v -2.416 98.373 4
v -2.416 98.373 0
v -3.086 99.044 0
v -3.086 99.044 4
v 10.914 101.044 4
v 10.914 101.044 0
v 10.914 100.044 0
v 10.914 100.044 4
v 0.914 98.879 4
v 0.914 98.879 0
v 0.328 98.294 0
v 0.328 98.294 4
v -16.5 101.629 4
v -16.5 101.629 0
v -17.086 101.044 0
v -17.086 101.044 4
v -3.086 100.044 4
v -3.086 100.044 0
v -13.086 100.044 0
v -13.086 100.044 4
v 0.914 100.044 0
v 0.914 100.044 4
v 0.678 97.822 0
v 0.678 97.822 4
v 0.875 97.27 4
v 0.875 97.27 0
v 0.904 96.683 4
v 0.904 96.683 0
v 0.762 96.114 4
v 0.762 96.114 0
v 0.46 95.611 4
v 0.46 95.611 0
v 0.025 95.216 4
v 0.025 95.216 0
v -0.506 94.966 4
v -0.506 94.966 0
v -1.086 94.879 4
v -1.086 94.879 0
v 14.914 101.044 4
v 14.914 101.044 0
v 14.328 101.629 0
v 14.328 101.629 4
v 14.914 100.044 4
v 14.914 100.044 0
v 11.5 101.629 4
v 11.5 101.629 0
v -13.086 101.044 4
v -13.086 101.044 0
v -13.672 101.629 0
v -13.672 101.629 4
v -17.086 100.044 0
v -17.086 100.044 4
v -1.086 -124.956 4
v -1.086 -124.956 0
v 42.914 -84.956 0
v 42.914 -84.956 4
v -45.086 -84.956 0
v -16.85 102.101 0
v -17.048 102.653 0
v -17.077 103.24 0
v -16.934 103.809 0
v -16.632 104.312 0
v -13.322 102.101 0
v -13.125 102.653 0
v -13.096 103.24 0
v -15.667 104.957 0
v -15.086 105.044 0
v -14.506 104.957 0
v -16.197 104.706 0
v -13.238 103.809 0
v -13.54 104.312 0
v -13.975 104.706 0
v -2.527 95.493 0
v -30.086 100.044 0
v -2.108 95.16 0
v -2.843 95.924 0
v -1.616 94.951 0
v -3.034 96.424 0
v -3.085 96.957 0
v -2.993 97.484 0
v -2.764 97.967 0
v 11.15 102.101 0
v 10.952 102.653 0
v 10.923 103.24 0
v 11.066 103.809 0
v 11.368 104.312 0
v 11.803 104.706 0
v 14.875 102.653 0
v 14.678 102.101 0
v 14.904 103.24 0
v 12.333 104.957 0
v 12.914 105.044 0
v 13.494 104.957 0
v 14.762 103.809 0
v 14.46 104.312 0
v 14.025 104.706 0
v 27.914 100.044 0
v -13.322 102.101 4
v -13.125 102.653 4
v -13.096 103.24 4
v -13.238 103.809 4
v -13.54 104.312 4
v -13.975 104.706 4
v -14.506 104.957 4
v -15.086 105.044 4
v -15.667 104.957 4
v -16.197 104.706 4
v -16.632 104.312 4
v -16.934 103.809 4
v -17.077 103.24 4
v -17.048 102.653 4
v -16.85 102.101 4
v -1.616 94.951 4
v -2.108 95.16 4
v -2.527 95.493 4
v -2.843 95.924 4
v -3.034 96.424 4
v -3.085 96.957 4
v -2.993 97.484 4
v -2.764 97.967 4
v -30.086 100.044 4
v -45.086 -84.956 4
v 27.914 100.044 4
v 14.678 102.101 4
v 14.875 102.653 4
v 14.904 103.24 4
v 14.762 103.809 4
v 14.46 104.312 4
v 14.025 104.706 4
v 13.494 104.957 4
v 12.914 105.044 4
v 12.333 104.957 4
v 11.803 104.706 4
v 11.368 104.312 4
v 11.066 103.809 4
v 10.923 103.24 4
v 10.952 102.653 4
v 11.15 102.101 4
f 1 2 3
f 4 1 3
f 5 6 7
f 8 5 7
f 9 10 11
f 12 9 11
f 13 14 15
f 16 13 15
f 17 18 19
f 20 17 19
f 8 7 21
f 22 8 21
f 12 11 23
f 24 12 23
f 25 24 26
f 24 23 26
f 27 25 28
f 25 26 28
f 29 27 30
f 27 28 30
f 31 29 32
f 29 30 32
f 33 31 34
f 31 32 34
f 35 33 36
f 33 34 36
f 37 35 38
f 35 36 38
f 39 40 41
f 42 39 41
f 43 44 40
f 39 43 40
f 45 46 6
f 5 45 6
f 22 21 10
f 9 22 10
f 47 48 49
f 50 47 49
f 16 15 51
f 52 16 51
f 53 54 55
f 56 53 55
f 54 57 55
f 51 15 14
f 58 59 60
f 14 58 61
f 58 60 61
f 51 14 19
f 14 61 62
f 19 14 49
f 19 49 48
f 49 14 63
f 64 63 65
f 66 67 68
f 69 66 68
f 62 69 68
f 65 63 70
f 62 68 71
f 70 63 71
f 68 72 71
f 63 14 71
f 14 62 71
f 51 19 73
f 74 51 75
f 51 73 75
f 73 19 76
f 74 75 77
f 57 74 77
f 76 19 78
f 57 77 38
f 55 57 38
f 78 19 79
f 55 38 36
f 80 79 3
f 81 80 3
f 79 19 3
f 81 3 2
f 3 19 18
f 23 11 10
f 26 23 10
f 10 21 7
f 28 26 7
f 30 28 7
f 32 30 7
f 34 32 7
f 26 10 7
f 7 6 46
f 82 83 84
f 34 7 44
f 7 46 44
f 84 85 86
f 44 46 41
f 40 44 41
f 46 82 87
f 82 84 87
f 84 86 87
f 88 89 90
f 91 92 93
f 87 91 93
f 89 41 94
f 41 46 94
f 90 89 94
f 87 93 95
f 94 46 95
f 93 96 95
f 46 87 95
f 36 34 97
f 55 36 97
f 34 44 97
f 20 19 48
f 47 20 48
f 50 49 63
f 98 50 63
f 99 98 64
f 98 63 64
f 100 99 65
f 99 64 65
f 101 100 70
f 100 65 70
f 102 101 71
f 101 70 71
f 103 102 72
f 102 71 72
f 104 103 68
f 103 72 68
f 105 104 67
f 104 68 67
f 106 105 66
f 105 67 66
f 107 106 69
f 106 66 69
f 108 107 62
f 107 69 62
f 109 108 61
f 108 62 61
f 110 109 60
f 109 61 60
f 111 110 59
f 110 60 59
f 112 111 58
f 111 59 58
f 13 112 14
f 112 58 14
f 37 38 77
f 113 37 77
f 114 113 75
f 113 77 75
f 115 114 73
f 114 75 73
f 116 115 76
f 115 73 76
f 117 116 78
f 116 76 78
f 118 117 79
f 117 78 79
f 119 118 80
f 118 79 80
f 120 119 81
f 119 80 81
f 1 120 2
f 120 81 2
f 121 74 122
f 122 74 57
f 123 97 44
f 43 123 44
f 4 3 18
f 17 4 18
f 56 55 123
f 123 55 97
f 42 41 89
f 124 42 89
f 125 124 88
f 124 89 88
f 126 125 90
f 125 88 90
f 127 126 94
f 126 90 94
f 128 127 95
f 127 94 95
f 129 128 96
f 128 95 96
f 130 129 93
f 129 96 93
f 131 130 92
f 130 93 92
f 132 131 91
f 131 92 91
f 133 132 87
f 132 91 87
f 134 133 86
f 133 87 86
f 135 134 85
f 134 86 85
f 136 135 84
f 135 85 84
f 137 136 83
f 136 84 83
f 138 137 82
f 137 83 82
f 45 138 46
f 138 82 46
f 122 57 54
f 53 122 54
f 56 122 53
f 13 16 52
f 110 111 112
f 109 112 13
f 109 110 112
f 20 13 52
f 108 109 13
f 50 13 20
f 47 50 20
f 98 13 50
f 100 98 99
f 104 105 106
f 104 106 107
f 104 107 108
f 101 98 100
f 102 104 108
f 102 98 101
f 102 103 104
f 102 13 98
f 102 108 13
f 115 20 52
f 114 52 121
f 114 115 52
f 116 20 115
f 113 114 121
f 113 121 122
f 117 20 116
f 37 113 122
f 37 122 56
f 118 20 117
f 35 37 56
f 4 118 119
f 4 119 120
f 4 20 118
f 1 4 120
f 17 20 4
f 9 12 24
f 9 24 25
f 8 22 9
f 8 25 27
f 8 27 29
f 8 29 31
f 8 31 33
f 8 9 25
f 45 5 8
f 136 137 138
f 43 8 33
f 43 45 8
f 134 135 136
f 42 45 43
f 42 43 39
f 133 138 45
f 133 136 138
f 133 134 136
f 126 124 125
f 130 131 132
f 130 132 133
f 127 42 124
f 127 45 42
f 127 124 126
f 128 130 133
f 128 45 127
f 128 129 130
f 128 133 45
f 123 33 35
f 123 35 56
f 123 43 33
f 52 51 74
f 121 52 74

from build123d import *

# Parameters (mm, degrees)
F1_DEPTH = 4


with BuildPart() as f1:
    # F0 (on Top) → F1 (new body)
    with BuildSketch(Plane.XY):
        with BuildLine():
            Line((10.913862, 100.04352), (0.913862, 100.04352))
            Line((0.913862, 100.04352), (0.913862, 98.879407))
            Line((0.913862, 98.879407), (0.328076, 98.293621))
            ThreePointArc((0.328076, 98.293621), (0.761621, 96.11404), (-1.086138, 94.879407))
            ThreePointArc((-1.086138, 94.879407), (-2.955332, 96.167991), (-2.415912, 98.373295))
            Line((-2.415912, 98.373295), (-3.086138, 99.04352))
            Line((-3.086138, 99.04352), (-3.086138, 100.04352))
            Line((-3.086138, 100.04352), (-13.086138, 100.04352))
            Line((-13.086138, 100.04352), (-13.086138, 101.04352))
            Line((-13.086138, 101.04352), (-13.671924, 101.629306))
            ThreePointArc((-13.671924, 101.629306), (-15.086138, 105.04352), (-16.500351, 101.629306))
            Line((-16.500351, 101.629306), (-17.086138, 101.04352))
            Line((-17.086138, 101.04352), (-17.086138, 100.04352))
            Line((-17.086138, 100.04352), (-30.086138, 100.04352))
            Line((-30.086138, 100.04352), (-45.086138, -84.95648))
            Line((-45.086138, -84.95648), (-1.086138, -124.95648))
            Line((-1.086138, -124.95648), (42.913862, -84.95648))
            Line((42.913862, -84.95648), (27.913862, 100.04352))
            Line((27.913862, 100.04352), (14.913862, 100.04352))
            Line((14.913862, 100.04352), (10.913862, 100.04352))
        make_face()
        with BuildLine():
            Line((10.913862, 101.04352), (10.913862, 100.04352))
            Line((10.913862, 100.04352), (14.913862, 100.04352))
            Line((14.913862, 100.04352), (14.913862, 101.04352))
            Line((14.913862, 101.04352), (14.328076, 101.629306))
            ThreePointArc((14.328076, 101.629306), (12.913862, 105.04352), (11.499649, 101.629306))
            Line((11.499649, 101.629306), (10.913862, 101.04352))
        make_face()
    extrude(amount=F1_DEPTH)


solid = f1.part
